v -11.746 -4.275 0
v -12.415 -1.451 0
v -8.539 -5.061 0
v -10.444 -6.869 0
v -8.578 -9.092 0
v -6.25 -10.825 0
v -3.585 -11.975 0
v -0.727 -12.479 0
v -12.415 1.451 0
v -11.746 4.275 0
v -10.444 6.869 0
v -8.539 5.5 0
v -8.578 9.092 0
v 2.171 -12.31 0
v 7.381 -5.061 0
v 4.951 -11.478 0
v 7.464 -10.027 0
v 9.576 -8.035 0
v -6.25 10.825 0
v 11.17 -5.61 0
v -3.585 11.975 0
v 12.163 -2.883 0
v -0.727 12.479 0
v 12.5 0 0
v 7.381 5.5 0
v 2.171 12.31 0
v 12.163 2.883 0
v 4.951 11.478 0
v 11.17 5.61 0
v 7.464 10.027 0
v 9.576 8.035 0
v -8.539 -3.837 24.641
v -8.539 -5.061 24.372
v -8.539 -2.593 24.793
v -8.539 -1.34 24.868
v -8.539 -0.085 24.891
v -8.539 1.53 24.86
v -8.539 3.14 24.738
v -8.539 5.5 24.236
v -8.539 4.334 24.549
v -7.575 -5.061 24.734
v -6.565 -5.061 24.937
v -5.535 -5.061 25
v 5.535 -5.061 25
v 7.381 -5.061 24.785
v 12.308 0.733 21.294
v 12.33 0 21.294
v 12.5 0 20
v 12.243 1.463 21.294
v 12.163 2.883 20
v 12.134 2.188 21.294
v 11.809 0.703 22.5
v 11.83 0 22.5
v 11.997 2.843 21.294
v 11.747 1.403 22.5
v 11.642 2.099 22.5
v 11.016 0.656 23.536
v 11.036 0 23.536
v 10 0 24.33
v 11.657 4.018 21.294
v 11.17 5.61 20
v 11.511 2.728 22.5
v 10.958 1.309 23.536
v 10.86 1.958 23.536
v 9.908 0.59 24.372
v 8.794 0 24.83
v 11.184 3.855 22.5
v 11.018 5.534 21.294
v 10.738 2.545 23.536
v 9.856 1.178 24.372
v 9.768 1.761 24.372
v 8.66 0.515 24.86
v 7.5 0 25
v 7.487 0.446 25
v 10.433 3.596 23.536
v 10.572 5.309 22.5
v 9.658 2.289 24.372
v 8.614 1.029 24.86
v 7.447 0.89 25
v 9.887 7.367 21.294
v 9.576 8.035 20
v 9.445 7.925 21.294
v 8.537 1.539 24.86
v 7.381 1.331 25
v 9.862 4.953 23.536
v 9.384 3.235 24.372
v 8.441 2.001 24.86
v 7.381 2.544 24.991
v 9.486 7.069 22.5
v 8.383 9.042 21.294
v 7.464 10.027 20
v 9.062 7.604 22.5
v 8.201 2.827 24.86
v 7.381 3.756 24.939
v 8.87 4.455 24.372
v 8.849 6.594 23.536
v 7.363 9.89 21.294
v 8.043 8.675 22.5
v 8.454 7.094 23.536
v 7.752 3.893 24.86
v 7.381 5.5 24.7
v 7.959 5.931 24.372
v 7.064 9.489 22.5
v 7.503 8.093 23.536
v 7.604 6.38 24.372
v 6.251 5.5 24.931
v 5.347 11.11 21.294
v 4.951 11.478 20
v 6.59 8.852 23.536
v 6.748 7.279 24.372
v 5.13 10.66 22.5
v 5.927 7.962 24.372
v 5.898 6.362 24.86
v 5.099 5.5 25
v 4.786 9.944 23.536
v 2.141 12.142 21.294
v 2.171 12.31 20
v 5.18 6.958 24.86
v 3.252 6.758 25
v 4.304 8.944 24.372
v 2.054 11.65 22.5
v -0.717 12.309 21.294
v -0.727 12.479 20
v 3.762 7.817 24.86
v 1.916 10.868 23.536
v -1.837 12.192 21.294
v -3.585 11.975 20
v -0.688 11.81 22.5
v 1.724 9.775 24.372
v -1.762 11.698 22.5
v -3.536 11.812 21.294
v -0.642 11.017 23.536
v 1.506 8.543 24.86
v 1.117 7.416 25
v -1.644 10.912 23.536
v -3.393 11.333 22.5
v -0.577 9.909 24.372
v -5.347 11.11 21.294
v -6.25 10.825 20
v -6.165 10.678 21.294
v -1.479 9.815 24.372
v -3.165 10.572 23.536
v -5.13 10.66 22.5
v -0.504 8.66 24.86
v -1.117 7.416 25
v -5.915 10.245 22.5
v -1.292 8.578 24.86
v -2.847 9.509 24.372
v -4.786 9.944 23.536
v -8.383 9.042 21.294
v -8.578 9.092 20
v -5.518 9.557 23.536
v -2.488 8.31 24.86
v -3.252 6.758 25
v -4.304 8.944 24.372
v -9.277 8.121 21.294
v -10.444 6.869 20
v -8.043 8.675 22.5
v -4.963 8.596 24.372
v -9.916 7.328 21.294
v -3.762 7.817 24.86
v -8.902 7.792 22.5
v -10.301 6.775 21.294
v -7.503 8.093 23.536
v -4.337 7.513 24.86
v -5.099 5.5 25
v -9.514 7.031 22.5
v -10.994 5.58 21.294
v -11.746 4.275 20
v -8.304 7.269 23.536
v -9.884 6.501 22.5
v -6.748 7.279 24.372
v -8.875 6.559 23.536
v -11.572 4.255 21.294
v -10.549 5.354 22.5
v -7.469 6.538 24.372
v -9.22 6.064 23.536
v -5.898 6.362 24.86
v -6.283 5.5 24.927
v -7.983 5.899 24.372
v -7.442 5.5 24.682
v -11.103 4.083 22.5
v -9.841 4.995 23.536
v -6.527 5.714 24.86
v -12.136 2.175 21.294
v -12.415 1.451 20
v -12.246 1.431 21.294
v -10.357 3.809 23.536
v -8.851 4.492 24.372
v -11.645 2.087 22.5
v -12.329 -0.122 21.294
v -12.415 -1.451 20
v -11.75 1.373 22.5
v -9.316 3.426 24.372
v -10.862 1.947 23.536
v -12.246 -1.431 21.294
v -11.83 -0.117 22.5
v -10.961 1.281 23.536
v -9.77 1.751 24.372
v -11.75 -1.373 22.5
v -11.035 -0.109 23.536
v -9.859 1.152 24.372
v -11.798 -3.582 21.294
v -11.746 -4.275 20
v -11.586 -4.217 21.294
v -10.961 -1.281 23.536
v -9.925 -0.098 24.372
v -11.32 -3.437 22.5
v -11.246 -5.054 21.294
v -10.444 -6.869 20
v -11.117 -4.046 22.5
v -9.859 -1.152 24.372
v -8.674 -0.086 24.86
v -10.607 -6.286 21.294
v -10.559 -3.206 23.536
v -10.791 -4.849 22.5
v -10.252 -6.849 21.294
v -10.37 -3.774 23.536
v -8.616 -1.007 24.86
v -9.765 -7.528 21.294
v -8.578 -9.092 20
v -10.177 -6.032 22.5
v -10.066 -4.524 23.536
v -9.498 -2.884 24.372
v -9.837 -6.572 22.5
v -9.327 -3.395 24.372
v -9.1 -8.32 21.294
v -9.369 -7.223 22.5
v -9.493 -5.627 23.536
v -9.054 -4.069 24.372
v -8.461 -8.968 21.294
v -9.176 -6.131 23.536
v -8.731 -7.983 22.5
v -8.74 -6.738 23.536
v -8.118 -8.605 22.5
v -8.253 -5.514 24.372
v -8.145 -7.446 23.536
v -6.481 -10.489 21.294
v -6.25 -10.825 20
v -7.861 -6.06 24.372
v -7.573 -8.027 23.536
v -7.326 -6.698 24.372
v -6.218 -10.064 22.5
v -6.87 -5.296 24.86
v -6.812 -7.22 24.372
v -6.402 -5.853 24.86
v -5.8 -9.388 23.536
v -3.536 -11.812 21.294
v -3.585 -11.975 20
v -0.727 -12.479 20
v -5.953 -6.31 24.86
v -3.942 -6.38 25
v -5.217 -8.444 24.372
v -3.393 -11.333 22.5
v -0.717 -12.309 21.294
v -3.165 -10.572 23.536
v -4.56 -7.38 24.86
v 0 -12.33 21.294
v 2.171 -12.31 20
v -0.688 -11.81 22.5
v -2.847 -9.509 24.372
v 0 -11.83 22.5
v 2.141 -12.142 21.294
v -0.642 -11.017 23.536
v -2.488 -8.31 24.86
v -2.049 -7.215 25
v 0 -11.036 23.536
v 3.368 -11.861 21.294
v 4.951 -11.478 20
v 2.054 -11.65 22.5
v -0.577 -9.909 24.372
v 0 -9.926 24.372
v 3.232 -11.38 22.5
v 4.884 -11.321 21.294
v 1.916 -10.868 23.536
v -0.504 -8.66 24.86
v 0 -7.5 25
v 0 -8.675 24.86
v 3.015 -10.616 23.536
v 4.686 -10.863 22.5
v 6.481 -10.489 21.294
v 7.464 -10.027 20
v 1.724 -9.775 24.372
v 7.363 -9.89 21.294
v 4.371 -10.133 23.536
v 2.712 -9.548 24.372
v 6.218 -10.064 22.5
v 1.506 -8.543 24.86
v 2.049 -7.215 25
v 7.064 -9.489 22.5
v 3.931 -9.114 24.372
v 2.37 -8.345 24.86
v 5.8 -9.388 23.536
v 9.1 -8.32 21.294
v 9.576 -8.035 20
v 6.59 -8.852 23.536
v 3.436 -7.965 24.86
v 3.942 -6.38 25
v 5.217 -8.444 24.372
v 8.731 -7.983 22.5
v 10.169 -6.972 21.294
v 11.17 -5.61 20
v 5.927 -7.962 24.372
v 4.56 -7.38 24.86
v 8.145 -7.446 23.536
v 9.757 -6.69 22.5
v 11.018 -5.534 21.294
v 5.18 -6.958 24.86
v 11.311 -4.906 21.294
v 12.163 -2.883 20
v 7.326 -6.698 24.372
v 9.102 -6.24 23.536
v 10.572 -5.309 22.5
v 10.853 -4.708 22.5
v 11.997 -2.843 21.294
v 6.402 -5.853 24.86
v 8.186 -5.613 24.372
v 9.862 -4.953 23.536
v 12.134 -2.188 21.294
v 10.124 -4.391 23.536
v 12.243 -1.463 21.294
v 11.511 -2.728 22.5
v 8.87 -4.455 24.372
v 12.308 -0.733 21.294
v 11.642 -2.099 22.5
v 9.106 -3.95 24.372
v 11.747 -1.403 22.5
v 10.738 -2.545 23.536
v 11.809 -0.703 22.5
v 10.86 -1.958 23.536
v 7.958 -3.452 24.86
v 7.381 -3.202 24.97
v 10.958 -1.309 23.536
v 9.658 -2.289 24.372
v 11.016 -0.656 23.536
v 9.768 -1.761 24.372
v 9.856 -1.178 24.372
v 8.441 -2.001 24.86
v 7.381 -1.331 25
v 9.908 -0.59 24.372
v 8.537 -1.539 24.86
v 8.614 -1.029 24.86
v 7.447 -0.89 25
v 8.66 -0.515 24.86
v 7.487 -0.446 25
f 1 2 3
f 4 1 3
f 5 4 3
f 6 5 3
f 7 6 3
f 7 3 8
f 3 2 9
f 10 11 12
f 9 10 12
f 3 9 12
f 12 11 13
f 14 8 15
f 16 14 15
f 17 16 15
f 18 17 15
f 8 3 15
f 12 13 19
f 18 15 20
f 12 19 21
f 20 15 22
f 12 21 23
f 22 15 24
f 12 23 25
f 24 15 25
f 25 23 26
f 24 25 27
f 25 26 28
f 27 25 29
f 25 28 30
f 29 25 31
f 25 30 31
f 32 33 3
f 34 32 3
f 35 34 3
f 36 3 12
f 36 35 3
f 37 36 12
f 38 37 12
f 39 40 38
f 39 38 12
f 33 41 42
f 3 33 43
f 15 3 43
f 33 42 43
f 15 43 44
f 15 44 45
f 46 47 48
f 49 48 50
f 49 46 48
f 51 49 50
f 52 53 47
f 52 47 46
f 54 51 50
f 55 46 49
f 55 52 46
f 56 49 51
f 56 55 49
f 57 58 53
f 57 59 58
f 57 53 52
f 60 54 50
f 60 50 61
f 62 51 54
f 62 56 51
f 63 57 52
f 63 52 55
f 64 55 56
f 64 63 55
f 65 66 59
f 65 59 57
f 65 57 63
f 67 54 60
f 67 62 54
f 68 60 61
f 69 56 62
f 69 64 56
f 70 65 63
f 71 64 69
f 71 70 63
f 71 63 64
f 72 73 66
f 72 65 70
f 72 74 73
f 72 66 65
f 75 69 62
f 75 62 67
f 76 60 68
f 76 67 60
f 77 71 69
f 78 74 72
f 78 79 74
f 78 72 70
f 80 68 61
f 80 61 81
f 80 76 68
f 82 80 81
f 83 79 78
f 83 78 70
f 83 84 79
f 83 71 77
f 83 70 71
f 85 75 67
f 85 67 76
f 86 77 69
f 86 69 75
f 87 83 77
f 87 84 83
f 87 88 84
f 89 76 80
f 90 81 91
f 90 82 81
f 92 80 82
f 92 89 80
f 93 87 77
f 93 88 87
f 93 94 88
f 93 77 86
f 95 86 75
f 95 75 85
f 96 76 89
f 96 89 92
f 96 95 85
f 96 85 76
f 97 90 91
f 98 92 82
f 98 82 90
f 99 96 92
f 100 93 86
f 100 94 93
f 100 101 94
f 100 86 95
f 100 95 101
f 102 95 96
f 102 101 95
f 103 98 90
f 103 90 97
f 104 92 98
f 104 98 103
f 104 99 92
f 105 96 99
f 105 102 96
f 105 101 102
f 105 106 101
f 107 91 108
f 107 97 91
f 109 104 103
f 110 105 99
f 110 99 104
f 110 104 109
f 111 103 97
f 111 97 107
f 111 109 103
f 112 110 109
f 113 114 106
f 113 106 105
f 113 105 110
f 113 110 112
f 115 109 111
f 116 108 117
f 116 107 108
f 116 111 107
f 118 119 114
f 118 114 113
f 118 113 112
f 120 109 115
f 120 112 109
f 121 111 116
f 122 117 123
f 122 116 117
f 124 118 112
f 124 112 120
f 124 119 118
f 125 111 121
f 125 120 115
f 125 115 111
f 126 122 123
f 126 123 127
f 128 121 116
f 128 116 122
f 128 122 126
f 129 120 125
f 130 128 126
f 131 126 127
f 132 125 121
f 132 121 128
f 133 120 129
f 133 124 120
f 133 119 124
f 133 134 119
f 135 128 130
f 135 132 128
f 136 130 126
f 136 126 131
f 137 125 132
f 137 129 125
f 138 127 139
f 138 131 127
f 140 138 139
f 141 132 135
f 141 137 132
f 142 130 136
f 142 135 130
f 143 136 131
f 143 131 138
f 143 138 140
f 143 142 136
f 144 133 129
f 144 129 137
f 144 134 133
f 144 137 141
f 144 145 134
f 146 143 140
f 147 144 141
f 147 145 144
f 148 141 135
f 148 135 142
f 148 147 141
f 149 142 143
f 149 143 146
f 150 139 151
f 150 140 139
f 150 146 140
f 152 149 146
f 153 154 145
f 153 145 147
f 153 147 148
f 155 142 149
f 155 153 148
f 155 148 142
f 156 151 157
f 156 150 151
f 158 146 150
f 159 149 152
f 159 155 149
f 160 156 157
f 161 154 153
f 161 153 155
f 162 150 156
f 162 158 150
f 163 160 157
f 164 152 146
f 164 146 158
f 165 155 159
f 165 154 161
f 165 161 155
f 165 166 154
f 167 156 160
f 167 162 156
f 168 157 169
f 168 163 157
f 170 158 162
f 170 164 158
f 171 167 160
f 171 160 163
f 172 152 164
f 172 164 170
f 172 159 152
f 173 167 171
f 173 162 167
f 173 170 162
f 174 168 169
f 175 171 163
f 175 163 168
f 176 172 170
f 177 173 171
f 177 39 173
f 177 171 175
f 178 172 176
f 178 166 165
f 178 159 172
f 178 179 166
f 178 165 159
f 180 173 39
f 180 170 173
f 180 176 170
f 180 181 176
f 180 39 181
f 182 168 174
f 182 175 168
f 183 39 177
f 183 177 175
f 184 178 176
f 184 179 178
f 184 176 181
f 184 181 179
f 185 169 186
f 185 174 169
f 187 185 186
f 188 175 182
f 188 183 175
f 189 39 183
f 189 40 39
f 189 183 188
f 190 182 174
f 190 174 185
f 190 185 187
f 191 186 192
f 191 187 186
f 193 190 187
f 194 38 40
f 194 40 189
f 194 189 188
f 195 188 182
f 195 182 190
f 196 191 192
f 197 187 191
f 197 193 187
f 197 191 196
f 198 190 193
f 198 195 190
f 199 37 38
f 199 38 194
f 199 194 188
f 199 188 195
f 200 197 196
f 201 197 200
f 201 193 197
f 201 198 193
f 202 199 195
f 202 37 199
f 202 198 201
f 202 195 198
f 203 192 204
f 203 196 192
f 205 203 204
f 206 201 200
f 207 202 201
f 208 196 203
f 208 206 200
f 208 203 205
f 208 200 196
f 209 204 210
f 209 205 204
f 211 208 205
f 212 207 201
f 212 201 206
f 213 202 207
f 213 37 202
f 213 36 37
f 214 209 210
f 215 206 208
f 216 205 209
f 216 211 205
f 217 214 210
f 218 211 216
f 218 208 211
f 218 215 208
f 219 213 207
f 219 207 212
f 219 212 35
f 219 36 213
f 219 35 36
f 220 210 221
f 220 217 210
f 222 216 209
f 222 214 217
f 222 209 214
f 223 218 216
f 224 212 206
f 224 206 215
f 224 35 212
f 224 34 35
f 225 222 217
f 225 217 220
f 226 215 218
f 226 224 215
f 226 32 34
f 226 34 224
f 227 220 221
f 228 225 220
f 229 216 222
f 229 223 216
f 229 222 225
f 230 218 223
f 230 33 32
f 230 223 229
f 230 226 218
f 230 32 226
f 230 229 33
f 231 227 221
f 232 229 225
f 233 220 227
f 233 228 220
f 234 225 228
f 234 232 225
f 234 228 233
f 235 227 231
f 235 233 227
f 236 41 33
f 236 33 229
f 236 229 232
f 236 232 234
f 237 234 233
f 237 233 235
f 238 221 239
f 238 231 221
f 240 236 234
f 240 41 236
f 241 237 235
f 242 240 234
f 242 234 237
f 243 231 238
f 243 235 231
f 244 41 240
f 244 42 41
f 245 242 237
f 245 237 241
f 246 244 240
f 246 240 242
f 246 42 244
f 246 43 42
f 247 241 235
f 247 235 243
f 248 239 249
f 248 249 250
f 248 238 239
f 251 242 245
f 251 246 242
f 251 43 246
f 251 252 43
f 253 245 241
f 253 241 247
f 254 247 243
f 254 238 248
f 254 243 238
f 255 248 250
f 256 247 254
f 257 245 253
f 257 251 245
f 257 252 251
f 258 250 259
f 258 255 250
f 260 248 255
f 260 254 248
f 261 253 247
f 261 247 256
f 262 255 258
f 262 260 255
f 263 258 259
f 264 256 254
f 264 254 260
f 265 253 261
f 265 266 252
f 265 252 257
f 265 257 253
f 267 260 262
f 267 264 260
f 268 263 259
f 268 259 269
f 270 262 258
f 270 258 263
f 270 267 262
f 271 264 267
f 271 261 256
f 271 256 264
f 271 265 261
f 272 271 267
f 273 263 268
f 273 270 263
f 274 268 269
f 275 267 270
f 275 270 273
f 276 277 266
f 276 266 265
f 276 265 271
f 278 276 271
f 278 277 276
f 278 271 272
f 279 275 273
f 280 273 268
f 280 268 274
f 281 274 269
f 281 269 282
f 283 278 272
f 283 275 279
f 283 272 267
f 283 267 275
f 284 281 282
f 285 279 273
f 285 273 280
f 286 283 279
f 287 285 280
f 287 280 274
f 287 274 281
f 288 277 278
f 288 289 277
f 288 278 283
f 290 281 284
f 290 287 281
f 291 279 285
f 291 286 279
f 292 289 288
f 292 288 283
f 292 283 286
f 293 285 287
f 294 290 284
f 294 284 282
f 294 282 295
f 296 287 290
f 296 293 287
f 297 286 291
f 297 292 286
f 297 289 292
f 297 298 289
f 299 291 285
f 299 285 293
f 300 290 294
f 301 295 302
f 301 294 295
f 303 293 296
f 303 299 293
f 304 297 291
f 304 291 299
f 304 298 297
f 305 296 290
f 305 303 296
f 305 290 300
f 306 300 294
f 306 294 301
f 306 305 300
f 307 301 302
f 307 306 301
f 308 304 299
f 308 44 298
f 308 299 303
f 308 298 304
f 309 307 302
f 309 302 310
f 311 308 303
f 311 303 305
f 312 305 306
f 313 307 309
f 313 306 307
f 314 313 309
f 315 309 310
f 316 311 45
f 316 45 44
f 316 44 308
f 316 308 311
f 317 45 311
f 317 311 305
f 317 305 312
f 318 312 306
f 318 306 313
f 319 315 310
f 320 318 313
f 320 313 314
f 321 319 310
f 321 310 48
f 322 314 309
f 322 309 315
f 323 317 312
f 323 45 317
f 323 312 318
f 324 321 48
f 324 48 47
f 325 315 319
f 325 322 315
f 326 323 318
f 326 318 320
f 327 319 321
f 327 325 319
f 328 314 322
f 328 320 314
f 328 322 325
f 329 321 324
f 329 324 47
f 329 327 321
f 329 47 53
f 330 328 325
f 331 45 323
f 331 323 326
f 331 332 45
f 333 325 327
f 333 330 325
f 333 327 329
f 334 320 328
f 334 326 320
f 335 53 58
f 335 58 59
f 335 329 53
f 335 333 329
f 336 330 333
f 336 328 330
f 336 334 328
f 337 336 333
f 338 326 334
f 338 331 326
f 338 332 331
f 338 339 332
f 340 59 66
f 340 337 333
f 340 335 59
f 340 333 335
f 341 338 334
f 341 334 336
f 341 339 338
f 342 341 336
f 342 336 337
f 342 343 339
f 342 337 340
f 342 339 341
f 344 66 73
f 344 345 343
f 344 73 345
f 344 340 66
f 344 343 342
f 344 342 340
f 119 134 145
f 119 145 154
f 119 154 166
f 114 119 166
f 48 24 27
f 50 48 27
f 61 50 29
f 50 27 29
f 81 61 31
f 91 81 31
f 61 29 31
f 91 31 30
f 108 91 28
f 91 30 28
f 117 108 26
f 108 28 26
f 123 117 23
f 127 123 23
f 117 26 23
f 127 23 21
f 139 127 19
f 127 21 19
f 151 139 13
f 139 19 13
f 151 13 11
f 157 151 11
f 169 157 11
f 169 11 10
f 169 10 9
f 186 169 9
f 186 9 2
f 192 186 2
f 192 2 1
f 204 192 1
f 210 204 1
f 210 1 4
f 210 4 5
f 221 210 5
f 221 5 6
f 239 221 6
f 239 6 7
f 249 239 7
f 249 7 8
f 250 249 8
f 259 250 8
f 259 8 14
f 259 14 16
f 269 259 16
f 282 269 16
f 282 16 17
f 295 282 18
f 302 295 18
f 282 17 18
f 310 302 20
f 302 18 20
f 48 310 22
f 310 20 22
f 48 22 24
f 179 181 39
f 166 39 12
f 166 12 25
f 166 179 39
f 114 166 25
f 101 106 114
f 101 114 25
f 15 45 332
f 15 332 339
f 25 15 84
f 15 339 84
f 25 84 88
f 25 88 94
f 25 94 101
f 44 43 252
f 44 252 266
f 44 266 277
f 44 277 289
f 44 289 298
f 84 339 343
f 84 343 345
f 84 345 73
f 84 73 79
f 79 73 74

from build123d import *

# Parameters (mm, degrees)
F0_R     = 12.5
F1_DEPTH = 25
F2_W     = 15.9198134206
F2_H     = 10.5606685393
F3_DEPTH = 25


# Not quite as in the source:
# - a fillet or chamfer that OpenCascade refuses, or shapes differently, is made with other operations: its cross-section is extruded or revolved along the edge and cut away or added


with BuildPart() as f1:
    # F0 (on Top) → F1 (new body)
    with BuildSketch(Plane.XY):
        Circle(F0_R)
    extrude(amount=F1_DEPTH)

    # F2 (on face) → F3 (cut)
    with BuildSketch(Plane.XY.offset(25)):
        with Locations((-0.578898238, 0.2196121495)):
            Rectangle(F2_W, F2_H)
    extrude(amount=-F3_DEPTH, mode=Mode.SUBTRACT)

    # F4: fillet of radius 5 on 1 edges, made by hand

    # F4_s1 → F4_t2 (revolve, cut)
    with BuildSketch(Plane.XZ):
        with BuildLine():
            ThreePointArc((12.5, 20), (11.0355339059, 23.5355339059), (7.5, 25))
            Line((7.5, 25), (12.5, 25))
            Line((12.5, 25), (12.5, 20))
        make_face()
    revolve(axis=Axis((0, 0, 25), (0, 0, 1)), mode=Mode.SUBTRACT)


solid = f1.part
